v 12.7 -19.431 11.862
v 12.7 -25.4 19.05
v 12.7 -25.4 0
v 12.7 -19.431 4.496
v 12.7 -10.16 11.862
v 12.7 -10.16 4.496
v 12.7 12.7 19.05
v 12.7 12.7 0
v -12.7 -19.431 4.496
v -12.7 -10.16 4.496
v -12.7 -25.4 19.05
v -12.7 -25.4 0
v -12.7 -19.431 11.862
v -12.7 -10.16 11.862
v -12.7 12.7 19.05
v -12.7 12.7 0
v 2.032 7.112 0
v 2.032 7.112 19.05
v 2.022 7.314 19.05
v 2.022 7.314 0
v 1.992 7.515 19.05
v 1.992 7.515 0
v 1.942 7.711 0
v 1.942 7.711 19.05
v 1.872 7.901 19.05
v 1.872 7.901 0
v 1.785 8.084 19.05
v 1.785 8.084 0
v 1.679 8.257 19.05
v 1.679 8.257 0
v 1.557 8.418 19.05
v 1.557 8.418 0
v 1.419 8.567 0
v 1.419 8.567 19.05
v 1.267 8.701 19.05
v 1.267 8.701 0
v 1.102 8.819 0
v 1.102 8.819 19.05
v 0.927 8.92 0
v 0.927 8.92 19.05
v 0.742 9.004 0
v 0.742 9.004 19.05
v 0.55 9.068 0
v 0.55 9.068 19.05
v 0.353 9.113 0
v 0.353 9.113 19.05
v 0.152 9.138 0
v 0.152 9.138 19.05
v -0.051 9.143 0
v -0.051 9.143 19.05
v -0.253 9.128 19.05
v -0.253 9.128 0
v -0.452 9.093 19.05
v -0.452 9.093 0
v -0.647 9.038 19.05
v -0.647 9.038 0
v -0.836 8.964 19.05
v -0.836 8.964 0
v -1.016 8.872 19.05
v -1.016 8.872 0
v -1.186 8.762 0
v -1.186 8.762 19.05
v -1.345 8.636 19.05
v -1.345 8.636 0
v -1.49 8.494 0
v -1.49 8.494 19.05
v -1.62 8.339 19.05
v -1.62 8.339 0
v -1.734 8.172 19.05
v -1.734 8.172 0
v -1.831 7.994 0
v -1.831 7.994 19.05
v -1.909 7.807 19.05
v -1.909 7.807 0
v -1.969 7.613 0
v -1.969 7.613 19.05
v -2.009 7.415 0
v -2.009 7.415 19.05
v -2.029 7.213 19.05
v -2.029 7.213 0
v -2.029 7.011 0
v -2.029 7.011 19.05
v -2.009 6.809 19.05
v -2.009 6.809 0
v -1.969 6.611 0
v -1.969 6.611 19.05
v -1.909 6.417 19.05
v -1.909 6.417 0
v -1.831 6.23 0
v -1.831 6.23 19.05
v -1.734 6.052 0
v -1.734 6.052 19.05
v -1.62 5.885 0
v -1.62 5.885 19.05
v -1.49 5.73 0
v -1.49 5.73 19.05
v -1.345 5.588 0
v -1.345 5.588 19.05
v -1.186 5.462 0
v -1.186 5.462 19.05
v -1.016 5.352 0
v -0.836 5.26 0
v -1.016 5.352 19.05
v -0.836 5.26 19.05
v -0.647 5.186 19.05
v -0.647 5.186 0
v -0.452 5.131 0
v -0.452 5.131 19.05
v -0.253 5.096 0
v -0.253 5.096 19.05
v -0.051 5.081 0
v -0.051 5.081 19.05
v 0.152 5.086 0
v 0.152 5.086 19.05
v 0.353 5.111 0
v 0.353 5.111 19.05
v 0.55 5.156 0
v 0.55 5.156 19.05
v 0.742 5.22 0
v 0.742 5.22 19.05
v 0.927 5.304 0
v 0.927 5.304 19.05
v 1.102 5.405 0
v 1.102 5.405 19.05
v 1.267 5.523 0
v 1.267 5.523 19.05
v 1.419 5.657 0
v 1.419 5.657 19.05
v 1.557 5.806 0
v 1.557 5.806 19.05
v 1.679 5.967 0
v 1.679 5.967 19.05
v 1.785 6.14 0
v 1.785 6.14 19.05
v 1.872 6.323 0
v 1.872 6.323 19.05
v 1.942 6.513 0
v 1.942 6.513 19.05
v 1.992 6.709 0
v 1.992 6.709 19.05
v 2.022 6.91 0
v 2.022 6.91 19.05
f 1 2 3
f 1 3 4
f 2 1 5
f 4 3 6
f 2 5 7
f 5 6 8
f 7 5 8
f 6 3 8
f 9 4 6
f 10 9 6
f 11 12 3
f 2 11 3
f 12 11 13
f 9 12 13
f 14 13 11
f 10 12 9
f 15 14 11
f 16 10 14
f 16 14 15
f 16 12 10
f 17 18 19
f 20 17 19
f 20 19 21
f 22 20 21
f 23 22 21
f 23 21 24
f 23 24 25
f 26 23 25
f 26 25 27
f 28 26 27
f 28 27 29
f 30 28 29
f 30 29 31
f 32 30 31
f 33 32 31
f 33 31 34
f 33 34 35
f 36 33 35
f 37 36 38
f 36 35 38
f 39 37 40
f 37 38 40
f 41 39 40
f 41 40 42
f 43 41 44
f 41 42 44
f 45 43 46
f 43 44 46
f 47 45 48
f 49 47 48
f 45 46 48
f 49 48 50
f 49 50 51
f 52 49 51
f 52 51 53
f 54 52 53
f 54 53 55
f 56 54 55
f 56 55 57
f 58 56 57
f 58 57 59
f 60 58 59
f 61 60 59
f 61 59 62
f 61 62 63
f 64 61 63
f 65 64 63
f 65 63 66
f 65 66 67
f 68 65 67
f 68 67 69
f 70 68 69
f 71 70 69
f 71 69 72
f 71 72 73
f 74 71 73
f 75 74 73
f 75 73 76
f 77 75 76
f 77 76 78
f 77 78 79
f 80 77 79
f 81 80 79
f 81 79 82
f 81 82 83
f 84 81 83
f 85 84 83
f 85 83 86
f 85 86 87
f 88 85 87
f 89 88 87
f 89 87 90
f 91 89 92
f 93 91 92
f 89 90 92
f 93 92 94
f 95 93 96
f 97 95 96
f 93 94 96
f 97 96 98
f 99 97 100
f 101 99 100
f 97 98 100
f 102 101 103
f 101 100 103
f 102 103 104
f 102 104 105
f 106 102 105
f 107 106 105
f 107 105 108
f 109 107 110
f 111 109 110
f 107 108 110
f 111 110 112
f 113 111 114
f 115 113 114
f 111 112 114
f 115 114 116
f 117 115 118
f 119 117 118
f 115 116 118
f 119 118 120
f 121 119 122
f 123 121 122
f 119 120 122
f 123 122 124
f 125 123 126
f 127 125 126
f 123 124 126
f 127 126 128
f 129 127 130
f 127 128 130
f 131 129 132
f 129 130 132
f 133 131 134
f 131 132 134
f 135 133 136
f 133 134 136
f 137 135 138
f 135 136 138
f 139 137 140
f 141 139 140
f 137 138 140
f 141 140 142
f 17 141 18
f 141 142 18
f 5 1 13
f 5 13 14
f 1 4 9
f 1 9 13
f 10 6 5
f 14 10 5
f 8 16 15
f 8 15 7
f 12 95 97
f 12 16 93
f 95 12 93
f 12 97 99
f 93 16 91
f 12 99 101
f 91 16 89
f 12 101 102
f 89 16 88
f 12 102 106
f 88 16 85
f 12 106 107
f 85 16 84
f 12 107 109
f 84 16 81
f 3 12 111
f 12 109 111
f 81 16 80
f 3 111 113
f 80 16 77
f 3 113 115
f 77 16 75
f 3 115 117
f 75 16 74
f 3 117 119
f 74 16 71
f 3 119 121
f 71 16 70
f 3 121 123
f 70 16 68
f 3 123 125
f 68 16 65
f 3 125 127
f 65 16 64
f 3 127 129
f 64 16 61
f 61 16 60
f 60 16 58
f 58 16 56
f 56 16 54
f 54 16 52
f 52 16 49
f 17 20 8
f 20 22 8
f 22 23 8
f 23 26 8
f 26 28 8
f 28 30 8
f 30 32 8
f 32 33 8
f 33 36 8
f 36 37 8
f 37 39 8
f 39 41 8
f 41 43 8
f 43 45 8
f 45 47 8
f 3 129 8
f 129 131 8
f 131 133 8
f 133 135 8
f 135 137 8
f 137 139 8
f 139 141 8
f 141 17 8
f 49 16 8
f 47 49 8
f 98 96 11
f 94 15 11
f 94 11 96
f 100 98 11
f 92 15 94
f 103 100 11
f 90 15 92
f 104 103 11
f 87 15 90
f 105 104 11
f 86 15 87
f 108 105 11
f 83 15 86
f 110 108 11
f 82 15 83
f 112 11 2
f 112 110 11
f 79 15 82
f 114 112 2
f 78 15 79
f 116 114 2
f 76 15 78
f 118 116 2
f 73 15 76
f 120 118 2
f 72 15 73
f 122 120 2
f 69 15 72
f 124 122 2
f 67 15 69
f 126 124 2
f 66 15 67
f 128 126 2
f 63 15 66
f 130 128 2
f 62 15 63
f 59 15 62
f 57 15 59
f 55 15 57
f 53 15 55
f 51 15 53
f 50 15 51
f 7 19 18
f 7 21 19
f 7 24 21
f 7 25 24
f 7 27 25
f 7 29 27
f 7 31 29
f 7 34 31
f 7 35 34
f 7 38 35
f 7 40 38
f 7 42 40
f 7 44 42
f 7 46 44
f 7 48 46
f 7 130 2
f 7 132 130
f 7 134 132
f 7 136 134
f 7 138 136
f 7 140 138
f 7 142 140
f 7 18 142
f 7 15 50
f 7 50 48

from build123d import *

# Parameters (mm, degrees)
F0_W     = 25.4
F0_H     = 38.1
F1_DEPTH = 19.05
F2_R     = 2.032
F3_DEPTH = 25.4
F4_W     = 9.271
F4_H     = 7.366
F5_DEPTH = 25.4


with BuildPart() as f1:
    # F0 (on Top) → F1 (new body)
    with BuildSketch(Plane.XY):
        with Locations((0, -6.35)):
            Rectangle(F0_W, F0_H)
    extrude(amount=F1_DEPTH)

    # F2 (on face) → F3 (cut)
    with BuildSketch(Plane.XY.offset(19.05)):
        with Locations((0, 7.112)):
            Circle(F2_R)
    extrude(amount=-F3_DEPTH, mode=Mode.SUBTRACT)

    # F4 (on face) → F5 (cut)
    with BuildSketch(Plane.YZ.offset(12.7)):
        with Locations((-14.7955, 8.179266)):
            Rectangle(F4_W, F4_H)
    extrude(amount=-F5_DEPTH, mode=Mode.SUBTRACT)


solid = f1.part
